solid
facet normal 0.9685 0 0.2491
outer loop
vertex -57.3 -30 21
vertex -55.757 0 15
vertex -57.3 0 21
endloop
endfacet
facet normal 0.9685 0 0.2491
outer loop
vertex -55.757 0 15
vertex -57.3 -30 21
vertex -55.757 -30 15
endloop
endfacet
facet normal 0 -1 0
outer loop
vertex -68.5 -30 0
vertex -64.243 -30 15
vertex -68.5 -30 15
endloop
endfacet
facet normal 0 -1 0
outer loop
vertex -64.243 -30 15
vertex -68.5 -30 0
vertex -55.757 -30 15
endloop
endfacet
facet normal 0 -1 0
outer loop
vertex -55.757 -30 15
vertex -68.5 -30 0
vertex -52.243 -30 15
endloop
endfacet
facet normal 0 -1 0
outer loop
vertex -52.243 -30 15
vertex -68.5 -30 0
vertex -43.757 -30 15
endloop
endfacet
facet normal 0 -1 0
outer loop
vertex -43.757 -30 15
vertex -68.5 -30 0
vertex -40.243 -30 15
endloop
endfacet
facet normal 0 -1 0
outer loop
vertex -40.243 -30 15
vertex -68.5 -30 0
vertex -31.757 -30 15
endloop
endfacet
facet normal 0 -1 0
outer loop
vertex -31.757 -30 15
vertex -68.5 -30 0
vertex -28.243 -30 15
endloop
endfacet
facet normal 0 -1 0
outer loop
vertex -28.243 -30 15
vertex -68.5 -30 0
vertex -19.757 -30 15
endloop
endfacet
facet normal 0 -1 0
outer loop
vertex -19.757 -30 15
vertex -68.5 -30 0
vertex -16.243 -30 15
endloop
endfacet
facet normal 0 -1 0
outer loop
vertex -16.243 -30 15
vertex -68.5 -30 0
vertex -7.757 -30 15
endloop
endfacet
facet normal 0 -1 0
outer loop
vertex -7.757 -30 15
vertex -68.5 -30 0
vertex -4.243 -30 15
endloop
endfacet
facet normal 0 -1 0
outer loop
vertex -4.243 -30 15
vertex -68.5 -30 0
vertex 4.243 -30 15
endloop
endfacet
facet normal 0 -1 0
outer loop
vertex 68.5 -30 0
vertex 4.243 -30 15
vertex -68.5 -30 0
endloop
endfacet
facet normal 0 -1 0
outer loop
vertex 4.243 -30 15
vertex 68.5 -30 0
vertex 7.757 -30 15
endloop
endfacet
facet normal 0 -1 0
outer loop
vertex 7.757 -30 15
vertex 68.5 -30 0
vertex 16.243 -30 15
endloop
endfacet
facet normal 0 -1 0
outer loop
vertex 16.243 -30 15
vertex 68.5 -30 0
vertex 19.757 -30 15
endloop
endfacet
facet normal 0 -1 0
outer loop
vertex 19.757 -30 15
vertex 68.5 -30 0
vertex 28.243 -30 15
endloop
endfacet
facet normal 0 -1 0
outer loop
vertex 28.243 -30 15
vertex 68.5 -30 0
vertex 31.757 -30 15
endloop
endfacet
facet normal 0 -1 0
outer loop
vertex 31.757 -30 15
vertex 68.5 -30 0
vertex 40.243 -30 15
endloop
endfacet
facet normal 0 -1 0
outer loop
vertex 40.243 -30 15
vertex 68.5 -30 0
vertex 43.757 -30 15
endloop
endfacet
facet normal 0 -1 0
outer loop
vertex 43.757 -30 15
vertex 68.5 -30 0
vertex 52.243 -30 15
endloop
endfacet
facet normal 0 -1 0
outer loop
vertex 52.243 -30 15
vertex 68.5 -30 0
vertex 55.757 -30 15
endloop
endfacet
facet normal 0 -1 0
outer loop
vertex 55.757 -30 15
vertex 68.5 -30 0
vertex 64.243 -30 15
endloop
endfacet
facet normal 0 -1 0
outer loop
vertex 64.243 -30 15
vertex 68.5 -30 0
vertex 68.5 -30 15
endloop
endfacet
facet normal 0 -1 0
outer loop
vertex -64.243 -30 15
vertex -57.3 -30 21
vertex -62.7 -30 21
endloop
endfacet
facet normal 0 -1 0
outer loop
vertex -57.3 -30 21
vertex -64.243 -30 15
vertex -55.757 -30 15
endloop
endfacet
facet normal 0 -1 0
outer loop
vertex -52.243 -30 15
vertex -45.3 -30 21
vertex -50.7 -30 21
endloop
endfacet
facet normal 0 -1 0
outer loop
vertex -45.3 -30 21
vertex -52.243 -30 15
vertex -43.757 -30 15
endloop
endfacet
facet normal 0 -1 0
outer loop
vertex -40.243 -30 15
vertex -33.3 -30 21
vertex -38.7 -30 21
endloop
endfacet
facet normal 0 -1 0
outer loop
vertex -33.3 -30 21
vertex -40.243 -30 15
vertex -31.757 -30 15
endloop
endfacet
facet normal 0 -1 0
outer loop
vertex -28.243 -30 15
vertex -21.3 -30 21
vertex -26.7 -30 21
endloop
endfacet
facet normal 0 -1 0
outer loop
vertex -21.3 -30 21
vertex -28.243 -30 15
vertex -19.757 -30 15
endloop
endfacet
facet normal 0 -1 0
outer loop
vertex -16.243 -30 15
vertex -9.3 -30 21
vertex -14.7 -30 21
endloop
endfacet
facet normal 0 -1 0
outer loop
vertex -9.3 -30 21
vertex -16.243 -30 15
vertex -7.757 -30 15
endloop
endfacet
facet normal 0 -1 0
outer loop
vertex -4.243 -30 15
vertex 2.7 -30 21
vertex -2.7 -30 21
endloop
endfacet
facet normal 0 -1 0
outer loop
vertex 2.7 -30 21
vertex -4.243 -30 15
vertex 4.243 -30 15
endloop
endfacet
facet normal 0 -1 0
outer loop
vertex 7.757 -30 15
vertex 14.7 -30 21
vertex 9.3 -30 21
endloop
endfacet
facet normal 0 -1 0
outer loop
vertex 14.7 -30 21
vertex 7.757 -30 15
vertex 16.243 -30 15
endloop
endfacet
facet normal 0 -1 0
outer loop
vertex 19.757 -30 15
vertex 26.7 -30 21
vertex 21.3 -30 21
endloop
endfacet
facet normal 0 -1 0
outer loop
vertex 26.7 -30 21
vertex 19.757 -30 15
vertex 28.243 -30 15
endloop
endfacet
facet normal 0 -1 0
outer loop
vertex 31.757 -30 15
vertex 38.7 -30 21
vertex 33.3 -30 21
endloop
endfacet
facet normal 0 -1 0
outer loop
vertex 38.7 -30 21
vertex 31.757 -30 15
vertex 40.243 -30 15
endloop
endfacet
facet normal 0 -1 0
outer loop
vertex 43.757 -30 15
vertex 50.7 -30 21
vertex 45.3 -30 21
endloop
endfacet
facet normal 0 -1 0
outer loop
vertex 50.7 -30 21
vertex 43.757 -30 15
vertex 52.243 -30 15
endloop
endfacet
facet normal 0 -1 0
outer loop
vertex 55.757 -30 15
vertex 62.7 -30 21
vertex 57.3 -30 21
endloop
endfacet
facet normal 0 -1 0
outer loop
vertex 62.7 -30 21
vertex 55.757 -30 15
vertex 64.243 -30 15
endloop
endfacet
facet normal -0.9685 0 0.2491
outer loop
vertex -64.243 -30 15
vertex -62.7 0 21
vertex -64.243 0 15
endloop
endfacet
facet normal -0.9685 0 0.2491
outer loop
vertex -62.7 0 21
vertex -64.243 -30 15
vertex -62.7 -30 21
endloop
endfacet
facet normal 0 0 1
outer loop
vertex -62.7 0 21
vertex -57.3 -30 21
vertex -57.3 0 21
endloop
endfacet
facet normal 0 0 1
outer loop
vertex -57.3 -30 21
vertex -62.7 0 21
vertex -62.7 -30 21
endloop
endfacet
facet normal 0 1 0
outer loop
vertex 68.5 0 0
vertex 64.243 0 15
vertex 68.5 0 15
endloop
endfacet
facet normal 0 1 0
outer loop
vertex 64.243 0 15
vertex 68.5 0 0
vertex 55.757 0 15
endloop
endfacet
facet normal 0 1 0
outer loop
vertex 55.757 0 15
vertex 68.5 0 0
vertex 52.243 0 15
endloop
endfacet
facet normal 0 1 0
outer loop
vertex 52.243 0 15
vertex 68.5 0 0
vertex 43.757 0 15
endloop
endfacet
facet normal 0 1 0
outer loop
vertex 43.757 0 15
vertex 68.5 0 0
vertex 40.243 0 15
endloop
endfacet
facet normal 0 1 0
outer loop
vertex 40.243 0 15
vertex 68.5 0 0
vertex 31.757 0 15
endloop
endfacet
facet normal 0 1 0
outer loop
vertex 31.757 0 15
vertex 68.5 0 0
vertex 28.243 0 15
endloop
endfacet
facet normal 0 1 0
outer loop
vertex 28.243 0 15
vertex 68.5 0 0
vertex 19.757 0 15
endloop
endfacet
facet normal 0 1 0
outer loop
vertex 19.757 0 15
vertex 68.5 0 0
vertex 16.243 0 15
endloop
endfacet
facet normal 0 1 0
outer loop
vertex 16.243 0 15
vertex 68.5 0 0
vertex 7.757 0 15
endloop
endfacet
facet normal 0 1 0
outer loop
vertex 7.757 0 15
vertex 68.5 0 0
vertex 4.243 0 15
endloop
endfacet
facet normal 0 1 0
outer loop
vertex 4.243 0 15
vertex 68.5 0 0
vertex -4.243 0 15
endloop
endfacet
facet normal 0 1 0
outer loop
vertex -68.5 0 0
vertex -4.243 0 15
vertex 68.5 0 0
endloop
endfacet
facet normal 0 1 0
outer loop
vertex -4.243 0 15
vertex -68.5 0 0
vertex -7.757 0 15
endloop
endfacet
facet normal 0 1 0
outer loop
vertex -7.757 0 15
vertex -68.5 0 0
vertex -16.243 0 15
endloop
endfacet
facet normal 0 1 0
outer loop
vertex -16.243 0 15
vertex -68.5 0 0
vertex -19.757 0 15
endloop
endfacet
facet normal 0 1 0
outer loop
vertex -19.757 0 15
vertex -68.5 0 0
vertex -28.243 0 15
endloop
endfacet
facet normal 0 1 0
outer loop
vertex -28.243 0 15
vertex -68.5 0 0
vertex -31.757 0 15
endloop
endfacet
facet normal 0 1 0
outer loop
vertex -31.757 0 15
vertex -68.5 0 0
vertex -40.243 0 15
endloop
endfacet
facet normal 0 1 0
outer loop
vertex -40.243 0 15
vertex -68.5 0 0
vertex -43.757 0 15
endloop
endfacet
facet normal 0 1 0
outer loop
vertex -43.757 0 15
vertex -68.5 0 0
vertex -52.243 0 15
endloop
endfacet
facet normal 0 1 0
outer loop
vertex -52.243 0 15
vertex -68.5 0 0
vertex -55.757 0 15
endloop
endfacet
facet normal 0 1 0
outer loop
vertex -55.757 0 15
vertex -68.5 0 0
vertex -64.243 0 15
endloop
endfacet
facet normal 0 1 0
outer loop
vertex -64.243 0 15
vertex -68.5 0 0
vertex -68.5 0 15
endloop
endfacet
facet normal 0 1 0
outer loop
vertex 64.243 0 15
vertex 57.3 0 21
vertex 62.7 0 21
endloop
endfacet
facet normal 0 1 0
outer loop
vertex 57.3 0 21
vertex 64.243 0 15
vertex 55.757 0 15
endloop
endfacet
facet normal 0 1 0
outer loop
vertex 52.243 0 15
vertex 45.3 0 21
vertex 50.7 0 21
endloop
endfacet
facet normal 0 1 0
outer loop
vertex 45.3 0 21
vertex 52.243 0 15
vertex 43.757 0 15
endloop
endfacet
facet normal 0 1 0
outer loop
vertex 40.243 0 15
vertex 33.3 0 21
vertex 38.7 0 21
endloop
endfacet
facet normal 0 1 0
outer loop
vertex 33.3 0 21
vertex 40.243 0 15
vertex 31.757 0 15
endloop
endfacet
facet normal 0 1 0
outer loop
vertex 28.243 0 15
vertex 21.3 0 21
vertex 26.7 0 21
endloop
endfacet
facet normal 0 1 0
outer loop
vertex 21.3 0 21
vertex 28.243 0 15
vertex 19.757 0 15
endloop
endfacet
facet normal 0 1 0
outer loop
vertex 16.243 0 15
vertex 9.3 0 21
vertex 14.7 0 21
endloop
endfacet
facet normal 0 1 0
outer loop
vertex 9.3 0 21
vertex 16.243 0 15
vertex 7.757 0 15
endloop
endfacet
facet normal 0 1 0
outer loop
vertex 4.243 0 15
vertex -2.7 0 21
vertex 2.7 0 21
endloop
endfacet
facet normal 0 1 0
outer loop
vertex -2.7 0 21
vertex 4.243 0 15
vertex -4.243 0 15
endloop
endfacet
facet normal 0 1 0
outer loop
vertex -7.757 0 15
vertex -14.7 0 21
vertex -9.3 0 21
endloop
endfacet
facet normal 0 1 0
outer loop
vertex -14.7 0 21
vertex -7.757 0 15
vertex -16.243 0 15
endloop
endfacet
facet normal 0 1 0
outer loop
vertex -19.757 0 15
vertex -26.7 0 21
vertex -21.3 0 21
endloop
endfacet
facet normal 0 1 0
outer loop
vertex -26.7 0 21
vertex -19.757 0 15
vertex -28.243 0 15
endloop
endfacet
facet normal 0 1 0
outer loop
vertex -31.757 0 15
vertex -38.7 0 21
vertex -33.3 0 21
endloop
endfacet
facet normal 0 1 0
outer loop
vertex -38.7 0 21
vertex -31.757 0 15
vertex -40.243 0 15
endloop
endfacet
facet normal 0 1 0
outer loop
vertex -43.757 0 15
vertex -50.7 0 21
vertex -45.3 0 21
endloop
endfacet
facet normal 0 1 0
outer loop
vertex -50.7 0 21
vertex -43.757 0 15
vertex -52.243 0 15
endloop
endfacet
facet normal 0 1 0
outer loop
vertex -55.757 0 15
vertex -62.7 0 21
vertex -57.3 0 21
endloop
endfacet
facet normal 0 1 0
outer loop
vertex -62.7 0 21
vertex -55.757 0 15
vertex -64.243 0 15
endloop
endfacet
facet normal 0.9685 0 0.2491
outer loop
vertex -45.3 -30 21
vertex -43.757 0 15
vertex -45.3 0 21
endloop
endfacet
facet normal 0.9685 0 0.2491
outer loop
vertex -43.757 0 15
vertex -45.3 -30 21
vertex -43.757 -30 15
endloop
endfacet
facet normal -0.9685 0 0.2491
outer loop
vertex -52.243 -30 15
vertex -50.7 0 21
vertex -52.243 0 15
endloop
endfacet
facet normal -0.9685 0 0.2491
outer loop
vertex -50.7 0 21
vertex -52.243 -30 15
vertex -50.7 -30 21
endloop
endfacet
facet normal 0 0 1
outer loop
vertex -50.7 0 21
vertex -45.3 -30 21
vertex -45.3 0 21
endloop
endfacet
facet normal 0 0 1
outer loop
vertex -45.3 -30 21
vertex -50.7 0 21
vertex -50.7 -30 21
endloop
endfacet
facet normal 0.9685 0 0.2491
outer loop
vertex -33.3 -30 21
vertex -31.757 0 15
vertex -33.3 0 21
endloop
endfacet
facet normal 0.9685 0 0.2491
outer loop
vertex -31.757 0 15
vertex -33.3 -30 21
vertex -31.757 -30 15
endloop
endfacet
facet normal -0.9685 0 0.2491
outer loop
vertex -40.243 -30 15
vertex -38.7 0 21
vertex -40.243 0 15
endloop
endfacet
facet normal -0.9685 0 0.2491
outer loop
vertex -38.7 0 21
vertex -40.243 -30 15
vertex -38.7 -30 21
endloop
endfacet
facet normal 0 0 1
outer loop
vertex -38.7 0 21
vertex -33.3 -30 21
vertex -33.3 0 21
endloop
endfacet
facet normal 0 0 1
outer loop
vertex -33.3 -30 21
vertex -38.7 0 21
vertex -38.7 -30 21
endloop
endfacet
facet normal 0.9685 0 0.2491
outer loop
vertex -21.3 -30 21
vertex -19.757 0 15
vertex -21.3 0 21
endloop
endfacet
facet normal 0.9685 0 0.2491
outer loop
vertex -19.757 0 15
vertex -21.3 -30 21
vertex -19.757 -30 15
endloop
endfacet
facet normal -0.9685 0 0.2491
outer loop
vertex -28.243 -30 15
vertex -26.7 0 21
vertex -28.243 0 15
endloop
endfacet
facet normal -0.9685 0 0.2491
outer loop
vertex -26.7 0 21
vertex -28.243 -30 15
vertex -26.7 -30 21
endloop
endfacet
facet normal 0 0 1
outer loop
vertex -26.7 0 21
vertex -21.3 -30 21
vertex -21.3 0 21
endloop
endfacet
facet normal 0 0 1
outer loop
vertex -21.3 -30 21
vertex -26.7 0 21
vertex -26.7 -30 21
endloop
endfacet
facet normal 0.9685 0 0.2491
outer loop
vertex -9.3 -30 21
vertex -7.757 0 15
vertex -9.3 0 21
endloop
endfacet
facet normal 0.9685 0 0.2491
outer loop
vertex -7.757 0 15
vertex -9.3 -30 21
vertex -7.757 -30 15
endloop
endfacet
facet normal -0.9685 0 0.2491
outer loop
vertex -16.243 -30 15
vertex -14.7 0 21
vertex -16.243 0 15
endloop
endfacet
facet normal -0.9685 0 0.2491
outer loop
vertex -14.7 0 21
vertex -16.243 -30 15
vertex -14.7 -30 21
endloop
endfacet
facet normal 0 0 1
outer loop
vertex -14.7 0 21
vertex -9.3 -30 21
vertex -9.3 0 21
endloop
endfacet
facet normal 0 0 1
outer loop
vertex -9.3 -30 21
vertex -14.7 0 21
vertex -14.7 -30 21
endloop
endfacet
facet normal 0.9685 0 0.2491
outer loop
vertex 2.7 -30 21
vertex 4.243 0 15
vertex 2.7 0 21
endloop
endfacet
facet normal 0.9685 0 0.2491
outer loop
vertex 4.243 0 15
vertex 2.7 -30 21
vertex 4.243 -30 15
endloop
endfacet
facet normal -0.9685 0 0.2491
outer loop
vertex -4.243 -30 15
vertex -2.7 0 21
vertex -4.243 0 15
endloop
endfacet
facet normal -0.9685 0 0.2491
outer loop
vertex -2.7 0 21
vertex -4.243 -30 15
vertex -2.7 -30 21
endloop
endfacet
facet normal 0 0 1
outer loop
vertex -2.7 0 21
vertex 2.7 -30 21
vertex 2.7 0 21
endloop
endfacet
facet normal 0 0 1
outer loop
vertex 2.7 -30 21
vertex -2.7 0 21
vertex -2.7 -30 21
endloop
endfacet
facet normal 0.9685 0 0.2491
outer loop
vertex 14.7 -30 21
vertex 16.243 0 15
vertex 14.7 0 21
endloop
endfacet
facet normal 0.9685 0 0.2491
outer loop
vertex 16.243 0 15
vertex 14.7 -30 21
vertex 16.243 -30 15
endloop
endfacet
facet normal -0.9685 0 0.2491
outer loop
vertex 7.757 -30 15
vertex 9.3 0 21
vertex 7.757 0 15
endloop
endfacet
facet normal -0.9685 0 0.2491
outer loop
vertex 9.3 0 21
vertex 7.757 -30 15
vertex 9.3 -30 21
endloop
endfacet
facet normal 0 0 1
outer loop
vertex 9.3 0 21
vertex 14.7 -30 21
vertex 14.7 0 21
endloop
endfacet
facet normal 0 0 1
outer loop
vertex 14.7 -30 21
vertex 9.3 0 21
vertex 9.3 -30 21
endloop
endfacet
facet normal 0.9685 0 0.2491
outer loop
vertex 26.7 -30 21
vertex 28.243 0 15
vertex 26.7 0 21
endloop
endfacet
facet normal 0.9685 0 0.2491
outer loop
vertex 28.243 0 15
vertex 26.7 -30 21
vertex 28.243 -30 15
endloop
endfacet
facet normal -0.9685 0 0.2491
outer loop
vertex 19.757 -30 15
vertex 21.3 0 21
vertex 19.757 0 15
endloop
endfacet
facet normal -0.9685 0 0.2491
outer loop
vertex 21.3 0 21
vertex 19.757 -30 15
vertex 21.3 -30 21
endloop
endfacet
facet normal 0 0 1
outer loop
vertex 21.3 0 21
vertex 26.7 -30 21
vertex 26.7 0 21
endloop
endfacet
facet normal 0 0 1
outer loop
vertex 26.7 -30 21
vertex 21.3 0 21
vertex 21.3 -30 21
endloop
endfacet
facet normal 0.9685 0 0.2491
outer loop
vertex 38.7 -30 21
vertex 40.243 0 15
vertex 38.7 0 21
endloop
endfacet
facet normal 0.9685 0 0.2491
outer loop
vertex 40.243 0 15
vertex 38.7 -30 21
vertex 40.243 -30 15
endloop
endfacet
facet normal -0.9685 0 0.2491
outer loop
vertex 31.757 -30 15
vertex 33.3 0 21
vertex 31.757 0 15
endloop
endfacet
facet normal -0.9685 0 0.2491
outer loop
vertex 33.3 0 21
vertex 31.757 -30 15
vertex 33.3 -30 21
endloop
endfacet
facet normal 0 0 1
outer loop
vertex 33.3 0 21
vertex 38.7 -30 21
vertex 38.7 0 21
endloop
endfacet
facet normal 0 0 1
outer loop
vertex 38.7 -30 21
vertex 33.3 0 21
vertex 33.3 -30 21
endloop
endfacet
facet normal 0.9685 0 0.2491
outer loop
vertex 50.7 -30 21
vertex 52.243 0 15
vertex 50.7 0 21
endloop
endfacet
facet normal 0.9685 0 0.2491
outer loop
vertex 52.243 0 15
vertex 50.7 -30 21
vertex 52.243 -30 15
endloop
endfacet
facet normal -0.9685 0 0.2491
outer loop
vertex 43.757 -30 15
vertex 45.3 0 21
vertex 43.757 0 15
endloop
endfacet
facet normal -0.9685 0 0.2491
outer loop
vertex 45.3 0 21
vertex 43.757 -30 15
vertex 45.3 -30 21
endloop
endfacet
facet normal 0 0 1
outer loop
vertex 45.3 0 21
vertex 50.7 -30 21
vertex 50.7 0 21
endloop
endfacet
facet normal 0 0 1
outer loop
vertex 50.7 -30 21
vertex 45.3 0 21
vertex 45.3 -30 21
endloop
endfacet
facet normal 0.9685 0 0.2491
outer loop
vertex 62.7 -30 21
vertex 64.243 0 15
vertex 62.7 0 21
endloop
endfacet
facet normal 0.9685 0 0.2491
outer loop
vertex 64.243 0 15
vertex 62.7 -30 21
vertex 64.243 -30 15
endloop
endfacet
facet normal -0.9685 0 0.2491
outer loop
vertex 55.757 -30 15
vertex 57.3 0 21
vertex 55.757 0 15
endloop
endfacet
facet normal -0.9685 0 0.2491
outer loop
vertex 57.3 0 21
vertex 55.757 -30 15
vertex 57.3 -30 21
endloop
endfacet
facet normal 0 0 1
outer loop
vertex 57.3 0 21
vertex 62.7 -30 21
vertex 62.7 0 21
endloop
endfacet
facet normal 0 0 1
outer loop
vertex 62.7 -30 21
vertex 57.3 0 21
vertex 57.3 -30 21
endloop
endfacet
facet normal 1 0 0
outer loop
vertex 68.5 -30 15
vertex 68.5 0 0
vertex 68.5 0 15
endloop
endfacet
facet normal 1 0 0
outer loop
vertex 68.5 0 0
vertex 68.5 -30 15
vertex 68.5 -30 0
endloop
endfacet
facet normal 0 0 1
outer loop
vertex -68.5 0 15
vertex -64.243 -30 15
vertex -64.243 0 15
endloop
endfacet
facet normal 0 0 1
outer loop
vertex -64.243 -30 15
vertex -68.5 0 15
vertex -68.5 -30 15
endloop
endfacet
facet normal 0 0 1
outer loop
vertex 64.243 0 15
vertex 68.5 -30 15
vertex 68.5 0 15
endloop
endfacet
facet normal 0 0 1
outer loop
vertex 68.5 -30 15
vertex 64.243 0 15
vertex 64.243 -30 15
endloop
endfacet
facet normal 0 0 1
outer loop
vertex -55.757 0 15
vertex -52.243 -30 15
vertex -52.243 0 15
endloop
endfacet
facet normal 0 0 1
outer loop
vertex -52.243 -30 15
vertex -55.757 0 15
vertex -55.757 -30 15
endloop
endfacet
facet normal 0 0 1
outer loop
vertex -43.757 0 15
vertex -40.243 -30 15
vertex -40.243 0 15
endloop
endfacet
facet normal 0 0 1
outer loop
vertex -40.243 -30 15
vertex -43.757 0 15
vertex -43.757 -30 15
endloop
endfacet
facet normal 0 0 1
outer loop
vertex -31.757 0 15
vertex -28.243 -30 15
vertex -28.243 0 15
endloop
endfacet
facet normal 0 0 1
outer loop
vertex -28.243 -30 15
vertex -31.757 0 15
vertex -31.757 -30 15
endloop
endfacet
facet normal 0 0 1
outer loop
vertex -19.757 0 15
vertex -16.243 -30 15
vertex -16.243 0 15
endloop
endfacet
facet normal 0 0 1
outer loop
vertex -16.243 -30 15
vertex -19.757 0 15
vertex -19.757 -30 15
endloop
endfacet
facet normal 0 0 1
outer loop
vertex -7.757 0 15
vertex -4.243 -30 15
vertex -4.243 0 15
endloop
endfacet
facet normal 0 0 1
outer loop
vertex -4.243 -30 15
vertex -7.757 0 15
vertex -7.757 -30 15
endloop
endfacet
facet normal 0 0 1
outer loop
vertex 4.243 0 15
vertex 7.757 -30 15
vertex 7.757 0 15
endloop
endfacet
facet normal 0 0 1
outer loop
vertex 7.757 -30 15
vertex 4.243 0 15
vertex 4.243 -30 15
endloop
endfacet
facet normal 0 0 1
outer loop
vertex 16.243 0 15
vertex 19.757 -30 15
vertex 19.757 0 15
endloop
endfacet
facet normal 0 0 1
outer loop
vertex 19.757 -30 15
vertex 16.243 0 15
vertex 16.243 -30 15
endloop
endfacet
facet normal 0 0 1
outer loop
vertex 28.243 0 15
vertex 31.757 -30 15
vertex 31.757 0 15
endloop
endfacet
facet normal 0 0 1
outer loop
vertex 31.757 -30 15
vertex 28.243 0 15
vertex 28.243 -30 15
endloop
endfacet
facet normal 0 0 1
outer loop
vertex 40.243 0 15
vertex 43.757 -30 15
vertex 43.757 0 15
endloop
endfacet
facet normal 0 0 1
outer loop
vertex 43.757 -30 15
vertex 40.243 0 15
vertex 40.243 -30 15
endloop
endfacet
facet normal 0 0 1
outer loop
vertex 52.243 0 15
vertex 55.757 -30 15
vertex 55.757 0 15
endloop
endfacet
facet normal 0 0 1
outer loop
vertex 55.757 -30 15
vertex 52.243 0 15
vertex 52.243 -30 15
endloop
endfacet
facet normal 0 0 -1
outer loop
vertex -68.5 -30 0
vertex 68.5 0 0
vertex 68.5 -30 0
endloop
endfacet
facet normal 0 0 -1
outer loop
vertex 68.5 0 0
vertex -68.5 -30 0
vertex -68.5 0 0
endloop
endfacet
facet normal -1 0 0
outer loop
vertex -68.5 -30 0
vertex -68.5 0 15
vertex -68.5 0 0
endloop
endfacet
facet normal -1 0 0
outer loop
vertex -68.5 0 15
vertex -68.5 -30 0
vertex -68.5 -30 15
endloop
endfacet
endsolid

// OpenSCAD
$fn = 32;

// ----------------------------------------------------------------------
// Toothed rack, 11 teeth
// 12 mm pitch, 6 mm teeth
// ----------------------------------------------------------------------

// --- parameters (mm) ---
bar_w = 30;     // bar width (Y)
bar_h = 15;     // bar height (Z)
teeth = 11;     // number of teeth
pitch = 12;     // tooth pitch
tooth_h = 6;    // tooth height above the bar
root_w = 9;     // tooth width at the root
crest_w = 5.4;  // tooth width at the crest

// --- derived feature positions (mm) ---
span = (teeth - 1) * pitch;  // = 120   distance between the outer teeth
bar_l = span + root_w + 8;   // = 137   bar length: teeth plus 4 mm at each end
tooth_x = -span / 2;         // = -60   X of the first tooth
height = bar_h + tooth_h;    // = 21   overall height
feature_centers = [
  [tooth_x + 0 * pitch, -bar_w / 2],
  [tooth_x + 1 * pitch, -bar_w / 2],
  [tooth_x + 2 * pitch, -bar_w / 2],
  [tooth_x + 3 * pitch, -bar_w / 2],
  [tooth_x + 4 * pitch, -bar_w / 2],
  [tooth_x + 5 * pitch, -bar_w / 2],
  [tooth_x + 6 * pitch, -bar_w / 2],
  [tooth_x + 7 * pitch, -bar_w / 2],
  [tooth_x + 8 * pitch, -bar_w / 2],
  [tooth_x + 9 * pitch, -bar_w / 2],
  [tooth_x + 10 * pitch, -bar_w / 2]
];   // tooth centre line, drives the tooth loop

// bar with a rack of teeth, one extruded trapezoium per centre
module rack_tooth() {
  linear_extrude(height = bar_w)
    polygon(points = [
      [0, 0],
      [root_w, 0],
      [root_w / 2 + crest_w / 2, tooth_h + 1],
      [root_w / 2 - crest_w / 2, tooth_h + 1]
    ]);
}

union() {
  translate([-bar_l / 2, -bar_w, 0]) cube([bar_l, bar_w, bar_h]);
  for (centre = feature_centers)
    translate([centre[0] - root_w / 2, 0, bar_h - 1]) rotate([90, 0, 0]) rack_tooth();
}
